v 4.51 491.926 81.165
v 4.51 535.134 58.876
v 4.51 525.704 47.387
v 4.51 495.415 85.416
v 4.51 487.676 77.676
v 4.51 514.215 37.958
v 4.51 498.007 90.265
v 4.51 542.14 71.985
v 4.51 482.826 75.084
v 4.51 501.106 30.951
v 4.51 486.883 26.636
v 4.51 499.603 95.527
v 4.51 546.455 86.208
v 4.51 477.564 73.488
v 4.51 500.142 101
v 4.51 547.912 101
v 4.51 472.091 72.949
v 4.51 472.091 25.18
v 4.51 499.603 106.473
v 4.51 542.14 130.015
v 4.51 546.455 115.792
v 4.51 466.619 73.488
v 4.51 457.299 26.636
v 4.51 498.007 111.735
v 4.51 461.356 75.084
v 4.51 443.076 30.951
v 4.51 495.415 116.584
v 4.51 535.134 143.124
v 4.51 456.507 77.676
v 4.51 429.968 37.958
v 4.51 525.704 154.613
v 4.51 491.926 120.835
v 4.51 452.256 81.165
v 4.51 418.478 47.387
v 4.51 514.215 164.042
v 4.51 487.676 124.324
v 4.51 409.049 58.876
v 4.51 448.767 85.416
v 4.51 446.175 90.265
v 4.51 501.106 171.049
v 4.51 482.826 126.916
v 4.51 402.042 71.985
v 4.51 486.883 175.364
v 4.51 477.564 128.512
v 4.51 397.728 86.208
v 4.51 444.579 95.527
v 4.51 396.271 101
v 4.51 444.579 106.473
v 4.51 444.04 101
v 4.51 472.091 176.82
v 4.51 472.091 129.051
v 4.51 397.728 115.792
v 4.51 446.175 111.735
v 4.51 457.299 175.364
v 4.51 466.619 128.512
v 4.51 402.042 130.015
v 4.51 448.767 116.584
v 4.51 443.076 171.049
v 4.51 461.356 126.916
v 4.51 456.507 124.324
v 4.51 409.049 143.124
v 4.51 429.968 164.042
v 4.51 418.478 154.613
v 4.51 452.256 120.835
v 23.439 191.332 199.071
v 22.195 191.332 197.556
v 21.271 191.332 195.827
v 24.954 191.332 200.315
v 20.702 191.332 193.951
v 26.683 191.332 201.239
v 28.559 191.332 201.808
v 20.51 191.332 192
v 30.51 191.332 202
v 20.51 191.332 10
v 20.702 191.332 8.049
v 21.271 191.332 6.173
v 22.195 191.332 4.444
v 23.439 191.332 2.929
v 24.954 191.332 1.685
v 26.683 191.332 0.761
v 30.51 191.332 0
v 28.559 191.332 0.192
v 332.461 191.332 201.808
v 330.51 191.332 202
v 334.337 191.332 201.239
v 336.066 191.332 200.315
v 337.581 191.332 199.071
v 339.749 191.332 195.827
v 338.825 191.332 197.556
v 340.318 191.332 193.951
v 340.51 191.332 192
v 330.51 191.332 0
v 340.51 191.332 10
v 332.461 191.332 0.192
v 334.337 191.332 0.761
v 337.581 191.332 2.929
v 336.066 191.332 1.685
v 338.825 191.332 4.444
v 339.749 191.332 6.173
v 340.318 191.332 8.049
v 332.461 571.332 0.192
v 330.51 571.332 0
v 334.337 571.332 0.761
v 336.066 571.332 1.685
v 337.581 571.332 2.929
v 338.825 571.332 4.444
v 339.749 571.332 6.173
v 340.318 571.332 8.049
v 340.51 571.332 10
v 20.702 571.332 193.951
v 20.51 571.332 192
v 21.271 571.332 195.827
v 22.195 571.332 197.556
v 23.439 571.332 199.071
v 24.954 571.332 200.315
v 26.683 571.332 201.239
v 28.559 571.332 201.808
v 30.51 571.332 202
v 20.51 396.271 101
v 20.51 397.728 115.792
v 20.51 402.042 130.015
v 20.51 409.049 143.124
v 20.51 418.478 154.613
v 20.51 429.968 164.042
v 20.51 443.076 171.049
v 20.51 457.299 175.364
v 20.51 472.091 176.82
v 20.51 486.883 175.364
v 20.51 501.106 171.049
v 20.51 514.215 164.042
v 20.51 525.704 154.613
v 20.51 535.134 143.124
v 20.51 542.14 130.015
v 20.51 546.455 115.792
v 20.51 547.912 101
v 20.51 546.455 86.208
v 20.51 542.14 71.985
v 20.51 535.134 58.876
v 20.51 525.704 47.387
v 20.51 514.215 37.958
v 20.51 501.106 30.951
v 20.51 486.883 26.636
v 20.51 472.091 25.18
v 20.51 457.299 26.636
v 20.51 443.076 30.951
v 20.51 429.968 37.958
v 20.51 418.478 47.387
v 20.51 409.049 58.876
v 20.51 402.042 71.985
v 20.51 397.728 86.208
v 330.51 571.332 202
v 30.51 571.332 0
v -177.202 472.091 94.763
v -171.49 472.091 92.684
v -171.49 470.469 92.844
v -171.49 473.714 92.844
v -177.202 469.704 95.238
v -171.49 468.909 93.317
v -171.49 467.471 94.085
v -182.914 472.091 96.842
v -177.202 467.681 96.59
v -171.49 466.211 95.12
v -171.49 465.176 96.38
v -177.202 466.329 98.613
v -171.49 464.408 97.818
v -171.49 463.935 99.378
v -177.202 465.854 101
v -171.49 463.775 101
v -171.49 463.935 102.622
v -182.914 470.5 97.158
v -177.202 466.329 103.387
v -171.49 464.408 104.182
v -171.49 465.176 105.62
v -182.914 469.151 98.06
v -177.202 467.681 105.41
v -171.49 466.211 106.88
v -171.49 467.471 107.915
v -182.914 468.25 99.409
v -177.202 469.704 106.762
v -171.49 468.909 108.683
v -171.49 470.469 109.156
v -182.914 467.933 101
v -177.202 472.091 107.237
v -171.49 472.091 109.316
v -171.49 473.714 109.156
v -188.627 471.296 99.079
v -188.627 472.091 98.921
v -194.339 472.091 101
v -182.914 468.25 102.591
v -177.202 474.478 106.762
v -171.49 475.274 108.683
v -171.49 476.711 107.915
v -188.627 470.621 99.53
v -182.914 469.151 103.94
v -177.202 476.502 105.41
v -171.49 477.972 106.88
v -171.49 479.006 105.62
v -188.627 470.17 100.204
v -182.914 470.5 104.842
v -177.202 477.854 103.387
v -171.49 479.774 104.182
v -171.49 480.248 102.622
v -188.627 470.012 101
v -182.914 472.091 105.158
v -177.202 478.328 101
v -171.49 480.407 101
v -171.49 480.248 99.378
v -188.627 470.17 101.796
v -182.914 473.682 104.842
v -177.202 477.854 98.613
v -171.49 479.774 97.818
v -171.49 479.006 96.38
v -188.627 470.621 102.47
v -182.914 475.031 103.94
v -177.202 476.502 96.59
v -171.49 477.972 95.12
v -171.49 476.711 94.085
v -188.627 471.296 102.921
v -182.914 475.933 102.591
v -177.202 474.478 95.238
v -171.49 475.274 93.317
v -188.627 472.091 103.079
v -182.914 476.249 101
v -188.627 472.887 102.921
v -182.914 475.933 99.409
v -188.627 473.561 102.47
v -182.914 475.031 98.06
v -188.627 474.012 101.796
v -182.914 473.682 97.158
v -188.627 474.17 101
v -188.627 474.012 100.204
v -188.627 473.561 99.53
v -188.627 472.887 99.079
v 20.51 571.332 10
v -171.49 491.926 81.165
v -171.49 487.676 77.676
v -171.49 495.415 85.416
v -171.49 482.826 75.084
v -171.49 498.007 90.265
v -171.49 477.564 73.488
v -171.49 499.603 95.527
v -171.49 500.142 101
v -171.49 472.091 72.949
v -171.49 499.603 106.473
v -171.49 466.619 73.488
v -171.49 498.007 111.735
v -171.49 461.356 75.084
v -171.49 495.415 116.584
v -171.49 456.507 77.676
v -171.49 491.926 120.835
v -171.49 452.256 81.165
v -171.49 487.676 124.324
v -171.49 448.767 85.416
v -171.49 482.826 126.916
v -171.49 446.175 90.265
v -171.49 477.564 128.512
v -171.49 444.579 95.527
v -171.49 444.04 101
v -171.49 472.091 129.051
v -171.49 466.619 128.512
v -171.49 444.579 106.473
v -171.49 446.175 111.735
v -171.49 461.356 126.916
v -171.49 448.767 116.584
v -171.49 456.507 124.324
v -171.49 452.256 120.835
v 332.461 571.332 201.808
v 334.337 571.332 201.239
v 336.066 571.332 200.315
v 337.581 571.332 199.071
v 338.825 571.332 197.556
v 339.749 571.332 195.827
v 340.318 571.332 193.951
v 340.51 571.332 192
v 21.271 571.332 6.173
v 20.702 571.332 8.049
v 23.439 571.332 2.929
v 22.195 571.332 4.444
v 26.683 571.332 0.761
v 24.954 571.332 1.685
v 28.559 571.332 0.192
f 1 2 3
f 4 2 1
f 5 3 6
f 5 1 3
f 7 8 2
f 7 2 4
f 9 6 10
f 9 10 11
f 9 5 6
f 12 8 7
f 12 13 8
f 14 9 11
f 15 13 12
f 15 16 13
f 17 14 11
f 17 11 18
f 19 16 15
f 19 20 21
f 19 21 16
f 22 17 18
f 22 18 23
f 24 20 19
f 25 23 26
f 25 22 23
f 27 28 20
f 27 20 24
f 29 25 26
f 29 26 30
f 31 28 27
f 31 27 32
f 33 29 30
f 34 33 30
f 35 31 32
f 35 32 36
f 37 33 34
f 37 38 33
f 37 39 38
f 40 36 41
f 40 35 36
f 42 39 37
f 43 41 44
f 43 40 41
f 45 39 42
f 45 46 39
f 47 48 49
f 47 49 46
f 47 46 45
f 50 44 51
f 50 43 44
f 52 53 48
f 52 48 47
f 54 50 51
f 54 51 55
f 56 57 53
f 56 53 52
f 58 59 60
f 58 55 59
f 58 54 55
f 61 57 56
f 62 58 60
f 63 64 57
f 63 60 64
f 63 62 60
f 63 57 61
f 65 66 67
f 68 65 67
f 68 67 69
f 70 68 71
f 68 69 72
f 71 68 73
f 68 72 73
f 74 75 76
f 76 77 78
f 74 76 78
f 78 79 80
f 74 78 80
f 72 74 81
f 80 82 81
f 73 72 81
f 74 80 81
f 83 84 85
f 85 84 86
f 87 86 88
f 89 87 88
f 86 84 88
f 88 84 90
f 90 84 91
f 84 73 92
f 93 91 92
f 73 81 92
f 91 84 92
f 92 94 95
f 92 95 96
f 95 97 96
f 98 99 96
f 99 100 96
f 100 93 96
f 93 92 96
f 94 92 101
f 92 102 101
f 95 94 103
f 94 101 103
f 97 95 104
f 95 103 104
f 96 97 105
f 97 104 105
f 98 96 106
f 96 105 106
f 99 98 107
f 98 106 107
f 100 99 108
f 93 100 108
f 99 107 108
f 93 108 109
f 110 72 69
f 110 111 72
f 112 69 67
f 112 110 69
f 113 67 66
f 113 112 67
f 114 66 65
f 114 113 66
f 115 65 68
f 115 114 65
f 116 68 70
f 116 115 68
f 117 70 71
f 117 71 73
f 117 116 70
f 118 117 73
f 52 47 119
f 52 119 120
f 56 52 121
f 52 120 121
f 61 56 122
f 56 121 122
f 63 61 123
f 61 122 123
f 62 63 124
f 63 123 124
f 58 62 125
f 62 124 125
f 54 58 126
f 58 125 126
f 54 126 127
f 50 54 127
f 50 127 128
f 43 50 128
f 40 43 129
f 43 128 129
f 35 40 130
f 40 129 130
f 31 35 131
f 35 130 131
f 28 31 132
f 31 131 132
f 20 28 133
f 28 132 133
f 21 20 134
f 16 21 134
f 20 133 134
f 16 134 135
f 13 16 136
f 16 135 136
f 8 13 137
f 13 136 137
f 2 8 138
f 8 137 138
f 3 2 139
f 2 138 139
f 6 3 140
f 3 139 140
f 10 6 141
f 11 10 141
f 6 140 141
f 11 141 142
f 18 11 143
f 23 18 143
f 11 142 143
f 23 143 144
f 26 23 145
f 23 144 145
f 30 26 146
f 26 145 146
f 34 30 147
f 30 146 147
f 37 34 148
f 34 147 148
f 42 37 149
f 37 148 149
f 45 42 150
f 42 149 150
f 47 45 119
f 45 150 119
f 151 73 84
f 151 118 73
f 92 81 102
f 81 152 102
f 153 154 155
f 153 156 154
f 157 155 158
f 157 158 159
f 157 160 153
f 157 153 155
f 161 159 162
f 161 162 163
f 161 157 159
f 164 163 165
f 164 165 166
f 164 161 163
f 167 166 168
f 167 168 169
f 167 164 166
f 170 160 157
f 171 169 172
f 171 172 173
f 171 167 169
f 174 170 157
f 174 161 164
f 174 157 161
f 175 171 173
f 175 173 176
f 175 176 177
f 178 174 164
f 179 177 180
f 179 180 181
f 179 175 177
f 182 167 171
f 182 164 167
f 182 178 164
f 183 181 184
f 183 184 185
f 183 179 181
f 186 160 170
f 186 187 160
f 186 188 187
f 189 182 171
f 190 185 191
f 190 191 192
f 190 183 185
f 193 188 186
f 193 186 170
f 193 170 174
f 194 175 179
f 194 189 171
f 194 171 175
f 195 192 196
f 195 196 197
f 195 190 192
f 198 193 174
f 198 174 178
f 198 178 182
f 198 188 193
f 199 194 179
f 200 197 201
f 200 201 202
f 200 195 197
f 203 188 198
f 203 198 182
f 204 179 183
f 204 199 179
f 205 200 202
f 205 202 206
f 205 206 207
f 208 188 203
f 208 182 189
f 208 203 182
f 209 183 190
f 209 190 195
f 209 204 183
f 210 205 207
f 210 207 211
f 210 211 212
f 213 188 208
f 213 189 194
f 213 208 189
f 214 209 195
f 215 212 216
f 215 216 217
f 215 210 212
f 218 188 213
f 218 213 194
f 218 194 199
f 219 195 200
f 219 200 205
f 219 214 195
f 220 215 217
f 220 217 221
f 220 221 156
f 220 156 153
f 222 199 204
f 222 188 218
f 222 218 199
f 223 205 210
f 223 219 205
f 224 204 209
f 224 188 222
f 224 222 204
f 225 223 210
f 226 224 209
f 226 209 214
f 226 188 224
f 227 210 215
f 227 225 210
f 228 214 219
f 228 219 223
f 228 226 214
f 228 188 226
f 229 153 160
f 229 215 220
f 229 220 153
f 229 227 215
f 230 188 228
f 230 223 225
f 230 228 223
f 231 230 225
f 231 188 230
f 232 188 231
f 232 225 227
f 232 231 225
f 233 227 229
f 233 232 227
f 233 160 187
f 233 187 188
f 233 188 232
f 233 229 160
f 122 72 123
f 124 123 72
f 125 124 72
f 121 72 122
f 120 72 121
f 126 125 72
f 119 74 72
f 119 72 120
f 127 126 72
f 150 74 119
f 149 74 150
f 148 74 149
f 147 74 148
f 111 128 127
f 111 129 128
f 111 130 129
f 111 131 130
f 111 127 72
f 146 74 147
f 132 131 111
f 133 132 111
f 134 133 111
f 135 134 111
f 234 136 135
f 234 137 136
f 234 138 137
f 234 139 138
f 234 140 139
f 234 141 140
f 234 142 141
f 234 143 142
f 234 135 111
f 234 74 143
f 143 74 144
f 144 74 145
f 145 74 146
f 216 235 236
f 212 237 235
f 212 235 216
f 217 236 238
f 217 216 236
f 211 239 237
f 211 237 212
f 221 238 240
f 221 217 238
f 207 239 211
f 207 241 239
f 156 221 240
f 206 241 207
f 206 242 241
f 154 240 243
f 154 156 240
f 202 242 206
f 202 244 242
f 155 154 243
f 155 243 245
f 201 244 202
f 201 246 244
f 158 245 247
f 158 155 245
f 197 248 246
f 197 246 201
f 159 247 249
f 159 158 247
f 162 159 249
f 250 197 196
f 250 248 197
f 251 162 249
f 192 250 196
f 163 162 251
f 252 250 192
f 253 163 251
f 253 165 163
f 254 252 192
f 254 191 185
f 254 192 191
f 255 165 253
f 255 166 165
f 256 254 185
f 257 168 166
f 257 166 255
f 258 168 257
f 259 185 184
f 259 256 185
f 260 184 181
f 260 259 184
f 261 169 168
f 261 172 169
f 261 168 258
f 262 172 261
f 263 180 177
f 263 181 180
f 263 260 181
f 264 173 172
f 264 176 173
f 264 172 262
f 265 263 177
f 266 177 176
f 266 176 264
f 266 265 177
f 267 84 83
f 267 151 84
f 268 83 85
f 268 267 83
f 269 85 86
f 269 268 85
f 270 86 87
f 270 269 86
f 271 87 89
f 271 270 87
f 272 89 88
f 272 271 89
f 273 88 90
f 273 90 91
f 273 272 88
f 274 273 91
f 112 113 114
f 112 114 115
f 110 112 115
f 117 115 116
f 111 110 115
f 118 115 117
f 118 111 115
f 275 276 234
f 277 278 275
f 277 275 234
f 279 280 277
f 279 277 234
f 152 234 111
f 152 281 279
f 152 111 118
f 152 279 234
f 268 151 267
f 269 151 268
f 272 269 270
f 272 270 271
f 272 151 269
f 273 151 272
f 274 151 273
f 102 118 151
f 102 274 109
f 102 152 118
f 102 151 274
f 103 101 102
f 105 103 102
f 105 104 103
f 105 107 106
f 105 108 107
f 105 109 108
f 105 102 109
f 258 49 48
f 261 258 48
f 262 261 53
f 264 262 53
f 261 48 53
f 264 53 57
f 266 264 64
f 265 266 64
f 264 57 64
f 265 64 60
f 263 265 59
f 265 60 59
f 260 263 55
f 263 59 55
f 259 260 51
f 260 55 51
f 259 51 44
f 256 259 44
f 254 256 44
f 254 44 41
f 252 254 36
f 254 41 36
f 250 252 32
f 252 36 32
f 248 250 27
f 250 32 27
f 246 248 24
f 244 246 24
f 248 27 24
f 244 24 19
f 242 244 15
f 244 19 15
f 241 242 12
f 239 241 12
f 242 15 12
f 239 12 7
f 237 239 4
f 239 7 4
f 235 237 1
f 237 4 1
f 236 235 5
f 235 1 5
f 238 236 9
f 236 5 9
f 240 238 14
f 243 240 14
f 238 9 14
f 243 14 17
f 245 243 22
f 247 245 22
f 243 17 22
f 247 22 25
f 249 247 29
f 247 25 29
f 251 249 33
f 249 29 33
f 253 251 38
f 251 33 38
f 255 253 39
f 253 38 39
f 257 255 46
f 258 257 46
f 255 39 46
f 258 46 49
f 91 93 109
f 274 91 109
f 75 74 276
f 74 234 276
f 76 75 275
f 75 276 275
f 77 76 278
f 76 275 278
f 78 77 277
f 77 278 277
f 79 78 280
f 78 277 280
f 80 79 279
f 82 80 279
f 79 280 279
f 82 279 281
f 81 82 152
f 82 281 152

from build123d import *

# Parameters (mm, degrees)
SZKIC1_W                    = 320
SZKIC1_H                    = 380
DODANIE_WYCI_GNI_CIE1_DEPTH = 202
SZKIC2_R                    = 75.8204014
DODANIE_WYCI_GNI_CIE2_DEPTH = 16
SZKIC3_R                    = 28.051161272
DODANIE_WYCI_GNI_CIE3_DEPTH = 176
ZAOKR_GLENIE1_R             = 10


with BuildPart() as part:
    # Szkic1 → Dodanie-wyciągnięcie1 (new body)
    with BuildSketch(Plane.XY):
        with Locations((180.509851846, 381.331636977)):
            Rectangle(SZKIC1_W, SZKIC1_H)
    extrude(amount=DODANIE_WYCI_GNI_CIE1_DEPTH)

    # Szkic2 → Dodanie-wyciągnięcie2 (add)
    with BuildSketch(Plane.ZY.offset(-20.509851846)):
        with Locations(Location((101, 472.09116861, 0), (0, 0, 270))):
            Circle(SZKIC2_R)
    extrude(amount=DODANIE_WYCI_GNI_CIE2_DEPTH)

    # Szkic3 → Dodanie-wyciągnięcie3 (add)
    with BuildSketch(Plane.ZY.offset(-4.509851846)):
        with Locations(Location((101, 472.09116861, 0), (0, 0, 270))):
            Circle(SZKIC3_R)
    extrude(amount=DODANIE_WYCI_GNI_CIE3_DEPTH)

    # Dodanie-wyciągnięcie4 cone 1 section (through the dimple's axis) → Dodanie-wyciągnięcie4 (revolve)
    with BuildSketch(Plane(origin=(-171.490148154, 472.09116861, 101), x_dir=(0, 0, -1), z_dir=(0, 1, 0))):
        Polygon((0, 0), (8.316206597, 0), (0, 22.848589841), align=None)
    revolve(axis=Axis((-171.490148154, 472.09116861, 101), (-1, 0, 0)))

    # Zaokrąglenie1
    zaokr_glenie1_edges = [part.edges().sort_by_distance(p)[0] for p in [
        (20.509851846, 381.331636977, 202),
        (340.509851846, 381.331636977, 202),
        (20.509851846, 381.331636977, 0),
        (340.509851846, 381.331636977, 0),
    ]]
    fillet(zaokr_glenie1_edges, radius=ZAOKR_GLENIE1_R)


solid = part.part
